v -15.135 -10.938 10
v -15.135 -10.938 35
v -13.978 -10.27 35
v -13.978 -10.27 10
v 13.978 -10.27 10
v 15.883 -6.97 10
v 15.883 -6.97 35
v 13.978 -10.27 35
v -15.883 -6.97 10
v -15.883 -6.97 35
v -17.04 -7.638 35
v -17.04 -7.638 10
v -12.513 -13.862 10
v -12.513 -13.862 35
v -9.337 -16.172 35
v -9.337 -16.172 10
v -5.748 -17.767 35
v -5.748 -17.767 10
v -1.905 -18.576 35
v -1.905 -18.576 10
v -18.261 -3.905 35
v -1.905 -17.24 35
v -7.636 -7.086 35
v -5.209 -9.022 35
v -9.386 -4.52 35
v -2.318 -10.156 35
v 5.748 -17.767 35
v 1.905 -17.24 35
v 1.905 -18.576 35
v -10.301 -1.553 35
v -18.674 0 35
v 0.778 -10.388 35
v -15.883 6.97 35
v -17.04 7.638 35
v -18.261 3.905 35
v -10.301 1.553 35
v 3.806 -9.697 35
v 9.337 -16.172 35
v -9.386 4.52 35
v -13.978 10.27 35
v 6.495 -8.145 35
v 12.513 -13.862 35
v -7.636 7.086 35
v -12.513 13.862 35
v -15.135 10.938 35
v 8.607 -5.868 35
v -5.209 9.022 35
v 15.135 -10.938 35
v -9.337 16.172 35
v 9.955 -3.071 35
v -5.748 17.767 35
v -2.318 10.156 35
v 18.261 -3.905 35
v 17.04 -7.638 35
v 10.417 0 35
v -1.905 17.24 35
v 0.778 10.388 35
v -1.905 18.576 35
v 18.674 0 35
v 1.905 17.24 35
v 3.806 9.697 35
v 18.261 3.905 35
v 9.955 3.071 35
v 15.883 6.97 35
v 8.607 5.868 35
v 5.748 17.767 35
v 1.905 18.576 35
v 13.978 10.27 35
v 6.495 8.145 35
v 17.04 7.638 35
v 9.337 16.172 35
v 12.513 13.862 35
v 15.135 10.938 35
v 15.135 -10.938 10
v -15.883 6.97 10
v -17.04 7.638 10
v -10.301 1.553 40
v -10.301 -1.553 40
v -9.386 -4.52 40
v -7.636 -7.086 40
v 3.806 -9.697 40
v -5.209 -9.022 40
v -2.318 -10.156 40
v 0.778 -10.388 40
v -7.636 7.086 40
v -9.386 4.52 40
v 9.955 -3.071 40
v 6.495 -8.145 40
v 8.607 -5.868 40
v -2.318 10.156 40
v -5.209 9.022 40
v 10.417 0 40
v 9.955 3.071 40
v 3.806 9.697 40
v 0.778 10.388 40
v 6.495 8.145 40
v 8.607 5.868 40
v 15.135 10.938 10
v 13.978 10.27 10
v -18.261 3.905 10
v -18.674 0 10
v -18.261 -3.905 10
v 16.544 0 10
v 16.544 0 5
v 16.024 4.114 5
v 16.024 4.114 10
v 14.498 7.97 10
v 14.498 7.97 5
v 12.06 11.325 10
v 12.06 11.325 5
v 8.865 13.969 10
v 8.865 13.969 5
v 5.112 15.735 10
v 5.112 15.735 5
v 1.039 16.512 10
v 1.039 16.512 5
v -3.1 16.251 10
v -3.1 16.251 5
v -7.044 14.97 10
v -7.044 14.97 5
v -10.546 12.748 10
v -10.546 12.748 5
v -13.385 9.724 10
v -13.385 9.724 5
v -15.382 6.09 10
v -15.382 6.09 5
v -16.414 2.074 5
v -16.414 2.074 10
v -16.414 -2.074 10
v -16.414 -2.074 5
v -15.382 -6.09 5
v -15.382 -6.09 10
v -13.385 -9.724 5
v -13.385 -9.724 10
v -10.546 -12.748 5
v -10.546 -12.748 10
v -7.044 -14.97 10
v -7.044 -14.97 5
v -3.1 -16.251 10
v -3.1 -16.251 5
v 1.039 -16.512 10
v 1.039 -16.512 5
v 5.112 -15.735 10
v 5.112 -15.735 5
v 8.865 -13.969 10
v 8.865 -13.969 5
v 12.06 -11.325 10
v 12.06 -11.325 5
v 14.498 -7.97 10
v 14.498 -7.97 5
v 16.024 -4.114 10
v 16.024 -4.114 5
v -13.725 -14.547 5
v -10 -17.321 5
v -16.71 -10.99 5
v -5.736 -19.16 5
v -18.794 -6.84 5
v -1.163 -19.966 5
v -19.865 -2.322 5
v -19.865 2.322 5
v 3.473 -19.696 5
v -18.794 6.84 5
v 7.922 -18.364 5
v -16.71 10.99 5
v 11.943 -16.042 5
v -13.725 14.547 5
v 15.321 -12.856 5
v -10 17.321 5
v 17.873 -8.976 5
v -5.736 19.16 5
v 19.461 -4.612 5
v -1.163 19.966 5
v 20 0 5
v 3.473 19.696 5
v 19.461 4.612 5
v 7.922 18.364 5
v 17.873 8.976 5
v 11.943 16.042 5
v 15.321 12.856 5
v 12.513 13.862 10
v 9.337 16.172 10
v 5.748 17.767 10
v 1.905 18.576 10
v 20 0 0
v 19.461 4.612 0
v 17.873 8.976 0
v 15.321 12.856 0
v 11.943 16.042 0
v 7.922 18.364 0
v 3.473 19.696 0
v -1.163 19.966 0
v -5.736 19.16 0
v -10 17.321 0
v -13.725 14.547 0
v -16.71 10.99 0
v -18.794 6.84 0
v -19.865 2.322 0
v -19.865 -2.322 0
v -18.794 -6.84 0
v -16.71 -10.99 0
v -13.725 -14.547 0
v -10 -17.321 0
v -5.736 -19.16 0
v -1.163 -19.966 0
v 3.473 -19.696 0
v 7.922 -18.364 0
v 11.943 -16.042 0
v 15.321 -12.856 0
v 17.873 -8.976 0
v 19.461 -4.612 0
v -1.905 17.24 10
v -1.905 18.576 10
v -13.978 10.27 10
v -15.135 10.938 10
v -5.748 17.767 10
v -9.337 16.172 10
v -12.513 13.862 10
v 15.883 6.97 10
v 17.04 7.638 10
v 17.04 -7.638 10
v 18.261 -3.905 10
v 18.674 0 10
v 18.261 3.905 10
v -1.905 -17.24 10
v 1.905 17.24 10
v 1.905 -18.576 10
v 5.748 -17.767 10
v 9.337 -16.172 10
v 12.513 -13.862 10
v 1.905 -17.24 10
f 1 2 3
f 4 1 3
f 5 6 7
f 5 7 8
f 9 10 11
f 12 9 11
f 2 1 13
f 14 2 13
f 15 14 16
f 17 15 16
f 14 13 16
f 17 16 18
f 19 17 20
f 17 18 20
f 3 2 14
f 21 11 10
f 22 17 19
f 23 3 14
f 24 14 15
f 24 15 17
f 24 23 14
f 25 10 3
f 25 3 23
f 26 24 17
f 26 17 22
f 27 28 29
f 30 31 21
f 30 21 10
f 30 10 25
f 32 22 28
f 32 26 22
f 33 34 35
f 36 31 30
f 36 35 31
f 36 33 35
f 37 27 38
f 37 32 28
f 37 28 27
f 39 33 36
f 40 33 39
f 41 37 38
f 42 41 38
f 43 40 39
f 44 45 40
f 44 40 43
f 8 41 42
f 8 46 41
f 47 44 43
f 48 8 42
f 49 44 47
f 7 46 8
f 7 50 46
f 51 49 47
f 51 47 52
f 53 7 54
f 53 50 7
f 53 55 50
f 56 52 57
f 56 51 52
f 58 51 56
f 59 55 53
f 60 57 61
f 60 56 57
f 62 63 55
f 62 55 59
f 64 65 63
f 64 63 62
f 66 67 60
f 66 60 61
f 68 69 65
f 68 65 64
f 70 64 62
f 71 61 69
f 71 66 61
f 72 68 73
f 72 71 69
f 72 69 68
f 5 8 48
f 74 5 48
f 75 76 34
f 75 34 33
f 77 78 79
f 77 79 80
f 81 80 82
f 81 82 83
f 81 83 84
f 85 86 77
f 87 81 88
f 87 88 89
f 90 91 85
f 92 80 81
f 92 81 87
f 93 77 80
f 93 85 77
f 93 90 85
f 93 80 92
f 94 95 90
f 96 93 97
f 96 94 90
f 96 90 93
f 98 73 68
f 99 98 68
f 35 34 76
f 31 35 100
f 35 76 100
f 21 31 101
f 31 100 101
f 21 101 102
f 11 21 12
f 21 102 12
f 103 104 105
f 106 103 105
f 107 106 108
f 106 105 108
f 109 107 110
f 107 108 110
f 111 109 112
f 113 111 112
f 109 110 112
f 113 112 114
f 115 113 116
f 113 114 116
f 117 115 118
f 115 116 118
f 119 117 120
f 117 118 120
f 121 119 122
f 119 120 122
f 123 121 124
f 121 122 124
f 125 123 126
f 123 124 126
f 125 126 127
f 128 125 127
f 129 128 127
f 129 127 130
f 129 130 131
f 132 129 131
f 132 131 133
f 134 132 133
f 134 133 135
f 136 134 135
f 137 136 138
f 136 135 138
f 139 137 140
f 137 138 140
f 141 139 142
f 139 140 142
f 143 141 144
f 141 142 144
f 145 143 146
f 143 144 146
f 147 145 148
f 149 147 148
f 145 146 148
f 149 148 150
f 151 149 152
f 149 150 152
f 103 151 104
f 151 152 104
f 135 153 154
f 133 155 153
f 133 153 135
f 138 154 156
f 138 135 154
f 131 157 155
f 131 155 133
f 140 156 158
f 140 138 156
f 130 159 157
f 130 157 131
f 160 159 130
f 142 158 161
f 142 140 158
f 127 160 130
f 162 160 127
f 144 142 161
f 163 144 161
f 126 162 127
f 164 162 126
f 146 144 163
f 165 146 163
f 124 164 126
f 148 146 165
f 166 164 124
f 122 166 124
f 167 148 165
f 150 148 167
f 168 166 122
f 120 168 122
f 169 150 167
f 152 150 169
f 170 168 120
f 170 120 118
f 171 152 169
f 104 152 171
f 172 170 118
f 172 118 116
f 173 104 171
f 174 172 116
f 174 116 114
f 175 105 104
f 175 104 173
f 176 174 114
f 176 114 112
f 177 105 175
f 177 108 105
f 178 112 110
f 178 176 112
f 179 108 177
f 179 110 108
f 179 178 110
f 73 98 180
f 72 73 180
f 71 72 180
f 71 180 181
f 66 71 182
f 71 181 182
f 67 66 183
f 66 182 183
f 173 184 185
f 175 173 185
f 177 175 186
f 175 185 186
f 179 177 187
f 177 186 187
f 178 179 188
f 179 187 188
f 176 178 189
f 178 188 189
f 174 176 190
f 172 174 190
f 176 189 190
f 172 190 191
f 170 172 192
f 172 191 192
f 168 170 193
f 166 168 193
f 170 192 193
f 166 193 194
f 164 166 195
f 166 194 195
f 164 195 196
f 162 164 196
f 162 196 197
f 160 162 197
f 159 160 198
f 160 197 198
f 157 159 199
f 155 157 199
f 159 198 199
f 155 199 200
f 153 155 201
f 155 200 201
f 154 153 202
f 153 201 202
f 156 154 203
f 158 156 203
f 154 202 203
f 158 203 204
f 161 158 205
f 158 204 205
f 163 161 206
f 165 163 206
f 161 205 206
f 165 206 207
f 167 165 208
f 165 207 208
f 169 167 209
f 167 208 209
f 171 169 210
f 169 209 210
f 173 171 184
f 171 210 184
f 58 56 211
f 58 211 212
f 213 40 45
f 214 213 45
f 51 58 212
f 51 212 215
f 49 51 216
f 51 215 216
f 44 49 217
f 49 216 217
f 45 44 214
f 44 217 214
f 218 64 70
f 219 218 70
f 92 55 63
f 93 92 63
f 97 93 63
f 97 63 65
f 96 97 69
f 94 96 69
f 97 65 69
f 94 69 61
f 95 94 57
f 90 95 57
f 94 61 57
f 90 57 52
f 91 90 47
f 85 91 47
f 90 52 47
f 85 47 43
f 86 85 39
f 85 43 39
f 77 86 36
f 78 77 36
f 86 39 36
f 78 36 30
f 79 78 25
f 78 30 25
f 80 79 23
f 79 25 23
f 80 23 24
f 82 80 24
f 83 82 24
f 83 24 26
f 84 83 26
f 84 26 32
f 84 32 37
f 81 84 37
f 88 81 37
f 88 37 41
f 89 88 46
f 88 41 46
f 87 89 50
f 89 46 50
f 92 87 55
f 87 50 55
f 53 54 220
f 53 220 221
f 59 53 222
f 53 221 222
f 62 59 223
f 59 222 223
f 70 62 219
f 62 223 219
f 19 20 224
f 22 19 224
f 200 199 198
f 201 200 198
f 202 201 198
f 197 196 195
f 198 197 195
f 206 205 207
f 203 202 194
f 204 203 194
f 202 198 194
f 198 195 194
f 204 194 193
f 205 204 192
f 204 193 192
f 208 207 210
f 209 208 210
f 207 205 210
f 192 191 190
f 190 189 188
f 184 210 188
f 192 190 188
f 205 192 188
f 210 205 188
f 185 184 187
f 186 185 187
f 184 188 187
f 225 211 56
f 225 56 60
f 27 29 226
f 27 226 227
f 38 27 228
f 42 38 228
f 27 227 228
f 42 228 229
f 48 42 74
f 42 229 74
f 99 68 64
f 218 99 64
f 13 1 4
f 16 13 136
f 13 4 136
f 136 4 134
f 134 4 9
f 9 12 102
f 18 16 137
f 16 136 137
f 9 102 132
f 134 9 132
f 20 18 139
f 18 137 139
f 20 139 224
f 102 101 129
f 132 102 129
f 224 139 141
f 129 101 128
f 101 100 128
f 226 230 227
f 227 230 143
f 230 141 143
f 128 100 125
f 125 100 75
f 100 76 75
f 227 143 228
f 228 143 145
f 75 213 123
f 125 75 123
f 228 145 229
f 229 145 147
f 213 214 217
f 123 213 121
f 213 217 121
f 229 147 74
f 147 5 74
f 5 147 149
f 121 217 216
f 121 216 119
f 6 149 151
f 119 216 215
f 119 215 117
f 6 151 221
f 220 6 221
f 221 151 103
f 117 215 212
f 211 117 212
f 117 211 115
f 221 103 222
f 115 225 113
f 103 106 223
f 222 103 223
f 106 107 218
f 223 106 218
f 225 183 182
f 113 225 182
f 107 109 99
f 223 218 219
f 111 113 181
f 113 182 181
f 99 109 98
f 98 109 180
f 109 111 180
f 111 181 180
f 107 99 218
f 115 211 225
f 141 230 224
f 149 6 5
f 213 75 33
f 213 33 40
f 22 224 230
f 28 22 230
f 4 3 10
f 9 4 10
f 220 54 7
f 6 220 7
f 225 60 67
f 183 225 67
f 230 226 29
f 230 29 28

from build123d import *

# Parameters (mm, degrees)
CROQUIS1_R              = 20
SALIENTE_EXTRUIR5_DEPTH = 5
CROQUIS6_R              = 16.544256432
SALIENTE_EXTRUIR6_DEPTH = 5
CROQUIS7_R              = 18.673739687
SALIENTE_EXTRUIR7_DEPTH = 25
CROQUIS8_W              = 3.810951086
CROQUIS8_H              = 2.867445731
CORTAR_EXTRUIR2_DEPTH   = 25
CROQUIS9_R              = 10.417374192
SALIENTE_EXTRUIR9_DEPTH = 5


with BuildPart() as part:
    # Croquis1 → Saliente-Extruir5 (new body)
    with BuildSketch(Plane.XY):
        Circle(CROQUIS1_R)
    extrude(amount=SALIENTE_EXTRUIR5_DEPTH)

    # Croquis6 → Saliente-Extruir6 (add)
    with BuildSketch(Plane.XY.offset(5)):
        Circle(CROQUIS6_R)
    extrude(amount=SALIENTE_EXTRUIR6_DEPTH)

    # Croquis7 → Saliente-Extruir7 (add)
    with BuildSketch(Plane.XY.offset(10)):
        Circle(CROQUIS7_R)
    extrude(amount=SALIENTE_EXTRUIR7_DEPTH)

    # Croquis8 → Cortar-Extruir2 (cut)
    with BuildSketch(Plane.XY.offset(35)):
        with Locations((0, 18.673739686)):
            Rectangle(CROQUIS8_W, CROQUIS8_H)
        Polygon((16.460835604, 11.703921503), (13.977554757, 10.270198637), (15.8830303, 6.969818184), (18.366311148, 8.403541049), align=None)
        Polygon((18.366311148, -8.403541049), (15.8830303, -6.969818184), (13.977554757, -10.270198637), (16.460835604, -11.703921503), align=None)
        with Locations((0, -18.673739686)):
            Rectangle(CROQUIS8_W, CROQUIS8_H)
        Polygon((-16.460835604, -11.703921503), (-13.977554757, -10.270198637), (-15.8830303, -6.969818184), (-18.366311148, -8.403541049), align=None)
        Polygon((-18.366311148, 8.403541049), (-15.8830303, 6.969818184), (-13.977554757, 10.270198637), (-16.460835604, 11.703921503), align=None)
    extrude(amount=-CORTAR_EXTRUIR2_DEPTH, mode=Mode.SUBTRACT)

    # Croquis9 → Saliente-Extruir9 (add)
    with BuildSketch(Plane.XY.offset(35)):
        Circle(CROQUIS9_R)
    extrude(amount=SALIENTE_EXTRUIR9_DEPTH)


solid = part.part
